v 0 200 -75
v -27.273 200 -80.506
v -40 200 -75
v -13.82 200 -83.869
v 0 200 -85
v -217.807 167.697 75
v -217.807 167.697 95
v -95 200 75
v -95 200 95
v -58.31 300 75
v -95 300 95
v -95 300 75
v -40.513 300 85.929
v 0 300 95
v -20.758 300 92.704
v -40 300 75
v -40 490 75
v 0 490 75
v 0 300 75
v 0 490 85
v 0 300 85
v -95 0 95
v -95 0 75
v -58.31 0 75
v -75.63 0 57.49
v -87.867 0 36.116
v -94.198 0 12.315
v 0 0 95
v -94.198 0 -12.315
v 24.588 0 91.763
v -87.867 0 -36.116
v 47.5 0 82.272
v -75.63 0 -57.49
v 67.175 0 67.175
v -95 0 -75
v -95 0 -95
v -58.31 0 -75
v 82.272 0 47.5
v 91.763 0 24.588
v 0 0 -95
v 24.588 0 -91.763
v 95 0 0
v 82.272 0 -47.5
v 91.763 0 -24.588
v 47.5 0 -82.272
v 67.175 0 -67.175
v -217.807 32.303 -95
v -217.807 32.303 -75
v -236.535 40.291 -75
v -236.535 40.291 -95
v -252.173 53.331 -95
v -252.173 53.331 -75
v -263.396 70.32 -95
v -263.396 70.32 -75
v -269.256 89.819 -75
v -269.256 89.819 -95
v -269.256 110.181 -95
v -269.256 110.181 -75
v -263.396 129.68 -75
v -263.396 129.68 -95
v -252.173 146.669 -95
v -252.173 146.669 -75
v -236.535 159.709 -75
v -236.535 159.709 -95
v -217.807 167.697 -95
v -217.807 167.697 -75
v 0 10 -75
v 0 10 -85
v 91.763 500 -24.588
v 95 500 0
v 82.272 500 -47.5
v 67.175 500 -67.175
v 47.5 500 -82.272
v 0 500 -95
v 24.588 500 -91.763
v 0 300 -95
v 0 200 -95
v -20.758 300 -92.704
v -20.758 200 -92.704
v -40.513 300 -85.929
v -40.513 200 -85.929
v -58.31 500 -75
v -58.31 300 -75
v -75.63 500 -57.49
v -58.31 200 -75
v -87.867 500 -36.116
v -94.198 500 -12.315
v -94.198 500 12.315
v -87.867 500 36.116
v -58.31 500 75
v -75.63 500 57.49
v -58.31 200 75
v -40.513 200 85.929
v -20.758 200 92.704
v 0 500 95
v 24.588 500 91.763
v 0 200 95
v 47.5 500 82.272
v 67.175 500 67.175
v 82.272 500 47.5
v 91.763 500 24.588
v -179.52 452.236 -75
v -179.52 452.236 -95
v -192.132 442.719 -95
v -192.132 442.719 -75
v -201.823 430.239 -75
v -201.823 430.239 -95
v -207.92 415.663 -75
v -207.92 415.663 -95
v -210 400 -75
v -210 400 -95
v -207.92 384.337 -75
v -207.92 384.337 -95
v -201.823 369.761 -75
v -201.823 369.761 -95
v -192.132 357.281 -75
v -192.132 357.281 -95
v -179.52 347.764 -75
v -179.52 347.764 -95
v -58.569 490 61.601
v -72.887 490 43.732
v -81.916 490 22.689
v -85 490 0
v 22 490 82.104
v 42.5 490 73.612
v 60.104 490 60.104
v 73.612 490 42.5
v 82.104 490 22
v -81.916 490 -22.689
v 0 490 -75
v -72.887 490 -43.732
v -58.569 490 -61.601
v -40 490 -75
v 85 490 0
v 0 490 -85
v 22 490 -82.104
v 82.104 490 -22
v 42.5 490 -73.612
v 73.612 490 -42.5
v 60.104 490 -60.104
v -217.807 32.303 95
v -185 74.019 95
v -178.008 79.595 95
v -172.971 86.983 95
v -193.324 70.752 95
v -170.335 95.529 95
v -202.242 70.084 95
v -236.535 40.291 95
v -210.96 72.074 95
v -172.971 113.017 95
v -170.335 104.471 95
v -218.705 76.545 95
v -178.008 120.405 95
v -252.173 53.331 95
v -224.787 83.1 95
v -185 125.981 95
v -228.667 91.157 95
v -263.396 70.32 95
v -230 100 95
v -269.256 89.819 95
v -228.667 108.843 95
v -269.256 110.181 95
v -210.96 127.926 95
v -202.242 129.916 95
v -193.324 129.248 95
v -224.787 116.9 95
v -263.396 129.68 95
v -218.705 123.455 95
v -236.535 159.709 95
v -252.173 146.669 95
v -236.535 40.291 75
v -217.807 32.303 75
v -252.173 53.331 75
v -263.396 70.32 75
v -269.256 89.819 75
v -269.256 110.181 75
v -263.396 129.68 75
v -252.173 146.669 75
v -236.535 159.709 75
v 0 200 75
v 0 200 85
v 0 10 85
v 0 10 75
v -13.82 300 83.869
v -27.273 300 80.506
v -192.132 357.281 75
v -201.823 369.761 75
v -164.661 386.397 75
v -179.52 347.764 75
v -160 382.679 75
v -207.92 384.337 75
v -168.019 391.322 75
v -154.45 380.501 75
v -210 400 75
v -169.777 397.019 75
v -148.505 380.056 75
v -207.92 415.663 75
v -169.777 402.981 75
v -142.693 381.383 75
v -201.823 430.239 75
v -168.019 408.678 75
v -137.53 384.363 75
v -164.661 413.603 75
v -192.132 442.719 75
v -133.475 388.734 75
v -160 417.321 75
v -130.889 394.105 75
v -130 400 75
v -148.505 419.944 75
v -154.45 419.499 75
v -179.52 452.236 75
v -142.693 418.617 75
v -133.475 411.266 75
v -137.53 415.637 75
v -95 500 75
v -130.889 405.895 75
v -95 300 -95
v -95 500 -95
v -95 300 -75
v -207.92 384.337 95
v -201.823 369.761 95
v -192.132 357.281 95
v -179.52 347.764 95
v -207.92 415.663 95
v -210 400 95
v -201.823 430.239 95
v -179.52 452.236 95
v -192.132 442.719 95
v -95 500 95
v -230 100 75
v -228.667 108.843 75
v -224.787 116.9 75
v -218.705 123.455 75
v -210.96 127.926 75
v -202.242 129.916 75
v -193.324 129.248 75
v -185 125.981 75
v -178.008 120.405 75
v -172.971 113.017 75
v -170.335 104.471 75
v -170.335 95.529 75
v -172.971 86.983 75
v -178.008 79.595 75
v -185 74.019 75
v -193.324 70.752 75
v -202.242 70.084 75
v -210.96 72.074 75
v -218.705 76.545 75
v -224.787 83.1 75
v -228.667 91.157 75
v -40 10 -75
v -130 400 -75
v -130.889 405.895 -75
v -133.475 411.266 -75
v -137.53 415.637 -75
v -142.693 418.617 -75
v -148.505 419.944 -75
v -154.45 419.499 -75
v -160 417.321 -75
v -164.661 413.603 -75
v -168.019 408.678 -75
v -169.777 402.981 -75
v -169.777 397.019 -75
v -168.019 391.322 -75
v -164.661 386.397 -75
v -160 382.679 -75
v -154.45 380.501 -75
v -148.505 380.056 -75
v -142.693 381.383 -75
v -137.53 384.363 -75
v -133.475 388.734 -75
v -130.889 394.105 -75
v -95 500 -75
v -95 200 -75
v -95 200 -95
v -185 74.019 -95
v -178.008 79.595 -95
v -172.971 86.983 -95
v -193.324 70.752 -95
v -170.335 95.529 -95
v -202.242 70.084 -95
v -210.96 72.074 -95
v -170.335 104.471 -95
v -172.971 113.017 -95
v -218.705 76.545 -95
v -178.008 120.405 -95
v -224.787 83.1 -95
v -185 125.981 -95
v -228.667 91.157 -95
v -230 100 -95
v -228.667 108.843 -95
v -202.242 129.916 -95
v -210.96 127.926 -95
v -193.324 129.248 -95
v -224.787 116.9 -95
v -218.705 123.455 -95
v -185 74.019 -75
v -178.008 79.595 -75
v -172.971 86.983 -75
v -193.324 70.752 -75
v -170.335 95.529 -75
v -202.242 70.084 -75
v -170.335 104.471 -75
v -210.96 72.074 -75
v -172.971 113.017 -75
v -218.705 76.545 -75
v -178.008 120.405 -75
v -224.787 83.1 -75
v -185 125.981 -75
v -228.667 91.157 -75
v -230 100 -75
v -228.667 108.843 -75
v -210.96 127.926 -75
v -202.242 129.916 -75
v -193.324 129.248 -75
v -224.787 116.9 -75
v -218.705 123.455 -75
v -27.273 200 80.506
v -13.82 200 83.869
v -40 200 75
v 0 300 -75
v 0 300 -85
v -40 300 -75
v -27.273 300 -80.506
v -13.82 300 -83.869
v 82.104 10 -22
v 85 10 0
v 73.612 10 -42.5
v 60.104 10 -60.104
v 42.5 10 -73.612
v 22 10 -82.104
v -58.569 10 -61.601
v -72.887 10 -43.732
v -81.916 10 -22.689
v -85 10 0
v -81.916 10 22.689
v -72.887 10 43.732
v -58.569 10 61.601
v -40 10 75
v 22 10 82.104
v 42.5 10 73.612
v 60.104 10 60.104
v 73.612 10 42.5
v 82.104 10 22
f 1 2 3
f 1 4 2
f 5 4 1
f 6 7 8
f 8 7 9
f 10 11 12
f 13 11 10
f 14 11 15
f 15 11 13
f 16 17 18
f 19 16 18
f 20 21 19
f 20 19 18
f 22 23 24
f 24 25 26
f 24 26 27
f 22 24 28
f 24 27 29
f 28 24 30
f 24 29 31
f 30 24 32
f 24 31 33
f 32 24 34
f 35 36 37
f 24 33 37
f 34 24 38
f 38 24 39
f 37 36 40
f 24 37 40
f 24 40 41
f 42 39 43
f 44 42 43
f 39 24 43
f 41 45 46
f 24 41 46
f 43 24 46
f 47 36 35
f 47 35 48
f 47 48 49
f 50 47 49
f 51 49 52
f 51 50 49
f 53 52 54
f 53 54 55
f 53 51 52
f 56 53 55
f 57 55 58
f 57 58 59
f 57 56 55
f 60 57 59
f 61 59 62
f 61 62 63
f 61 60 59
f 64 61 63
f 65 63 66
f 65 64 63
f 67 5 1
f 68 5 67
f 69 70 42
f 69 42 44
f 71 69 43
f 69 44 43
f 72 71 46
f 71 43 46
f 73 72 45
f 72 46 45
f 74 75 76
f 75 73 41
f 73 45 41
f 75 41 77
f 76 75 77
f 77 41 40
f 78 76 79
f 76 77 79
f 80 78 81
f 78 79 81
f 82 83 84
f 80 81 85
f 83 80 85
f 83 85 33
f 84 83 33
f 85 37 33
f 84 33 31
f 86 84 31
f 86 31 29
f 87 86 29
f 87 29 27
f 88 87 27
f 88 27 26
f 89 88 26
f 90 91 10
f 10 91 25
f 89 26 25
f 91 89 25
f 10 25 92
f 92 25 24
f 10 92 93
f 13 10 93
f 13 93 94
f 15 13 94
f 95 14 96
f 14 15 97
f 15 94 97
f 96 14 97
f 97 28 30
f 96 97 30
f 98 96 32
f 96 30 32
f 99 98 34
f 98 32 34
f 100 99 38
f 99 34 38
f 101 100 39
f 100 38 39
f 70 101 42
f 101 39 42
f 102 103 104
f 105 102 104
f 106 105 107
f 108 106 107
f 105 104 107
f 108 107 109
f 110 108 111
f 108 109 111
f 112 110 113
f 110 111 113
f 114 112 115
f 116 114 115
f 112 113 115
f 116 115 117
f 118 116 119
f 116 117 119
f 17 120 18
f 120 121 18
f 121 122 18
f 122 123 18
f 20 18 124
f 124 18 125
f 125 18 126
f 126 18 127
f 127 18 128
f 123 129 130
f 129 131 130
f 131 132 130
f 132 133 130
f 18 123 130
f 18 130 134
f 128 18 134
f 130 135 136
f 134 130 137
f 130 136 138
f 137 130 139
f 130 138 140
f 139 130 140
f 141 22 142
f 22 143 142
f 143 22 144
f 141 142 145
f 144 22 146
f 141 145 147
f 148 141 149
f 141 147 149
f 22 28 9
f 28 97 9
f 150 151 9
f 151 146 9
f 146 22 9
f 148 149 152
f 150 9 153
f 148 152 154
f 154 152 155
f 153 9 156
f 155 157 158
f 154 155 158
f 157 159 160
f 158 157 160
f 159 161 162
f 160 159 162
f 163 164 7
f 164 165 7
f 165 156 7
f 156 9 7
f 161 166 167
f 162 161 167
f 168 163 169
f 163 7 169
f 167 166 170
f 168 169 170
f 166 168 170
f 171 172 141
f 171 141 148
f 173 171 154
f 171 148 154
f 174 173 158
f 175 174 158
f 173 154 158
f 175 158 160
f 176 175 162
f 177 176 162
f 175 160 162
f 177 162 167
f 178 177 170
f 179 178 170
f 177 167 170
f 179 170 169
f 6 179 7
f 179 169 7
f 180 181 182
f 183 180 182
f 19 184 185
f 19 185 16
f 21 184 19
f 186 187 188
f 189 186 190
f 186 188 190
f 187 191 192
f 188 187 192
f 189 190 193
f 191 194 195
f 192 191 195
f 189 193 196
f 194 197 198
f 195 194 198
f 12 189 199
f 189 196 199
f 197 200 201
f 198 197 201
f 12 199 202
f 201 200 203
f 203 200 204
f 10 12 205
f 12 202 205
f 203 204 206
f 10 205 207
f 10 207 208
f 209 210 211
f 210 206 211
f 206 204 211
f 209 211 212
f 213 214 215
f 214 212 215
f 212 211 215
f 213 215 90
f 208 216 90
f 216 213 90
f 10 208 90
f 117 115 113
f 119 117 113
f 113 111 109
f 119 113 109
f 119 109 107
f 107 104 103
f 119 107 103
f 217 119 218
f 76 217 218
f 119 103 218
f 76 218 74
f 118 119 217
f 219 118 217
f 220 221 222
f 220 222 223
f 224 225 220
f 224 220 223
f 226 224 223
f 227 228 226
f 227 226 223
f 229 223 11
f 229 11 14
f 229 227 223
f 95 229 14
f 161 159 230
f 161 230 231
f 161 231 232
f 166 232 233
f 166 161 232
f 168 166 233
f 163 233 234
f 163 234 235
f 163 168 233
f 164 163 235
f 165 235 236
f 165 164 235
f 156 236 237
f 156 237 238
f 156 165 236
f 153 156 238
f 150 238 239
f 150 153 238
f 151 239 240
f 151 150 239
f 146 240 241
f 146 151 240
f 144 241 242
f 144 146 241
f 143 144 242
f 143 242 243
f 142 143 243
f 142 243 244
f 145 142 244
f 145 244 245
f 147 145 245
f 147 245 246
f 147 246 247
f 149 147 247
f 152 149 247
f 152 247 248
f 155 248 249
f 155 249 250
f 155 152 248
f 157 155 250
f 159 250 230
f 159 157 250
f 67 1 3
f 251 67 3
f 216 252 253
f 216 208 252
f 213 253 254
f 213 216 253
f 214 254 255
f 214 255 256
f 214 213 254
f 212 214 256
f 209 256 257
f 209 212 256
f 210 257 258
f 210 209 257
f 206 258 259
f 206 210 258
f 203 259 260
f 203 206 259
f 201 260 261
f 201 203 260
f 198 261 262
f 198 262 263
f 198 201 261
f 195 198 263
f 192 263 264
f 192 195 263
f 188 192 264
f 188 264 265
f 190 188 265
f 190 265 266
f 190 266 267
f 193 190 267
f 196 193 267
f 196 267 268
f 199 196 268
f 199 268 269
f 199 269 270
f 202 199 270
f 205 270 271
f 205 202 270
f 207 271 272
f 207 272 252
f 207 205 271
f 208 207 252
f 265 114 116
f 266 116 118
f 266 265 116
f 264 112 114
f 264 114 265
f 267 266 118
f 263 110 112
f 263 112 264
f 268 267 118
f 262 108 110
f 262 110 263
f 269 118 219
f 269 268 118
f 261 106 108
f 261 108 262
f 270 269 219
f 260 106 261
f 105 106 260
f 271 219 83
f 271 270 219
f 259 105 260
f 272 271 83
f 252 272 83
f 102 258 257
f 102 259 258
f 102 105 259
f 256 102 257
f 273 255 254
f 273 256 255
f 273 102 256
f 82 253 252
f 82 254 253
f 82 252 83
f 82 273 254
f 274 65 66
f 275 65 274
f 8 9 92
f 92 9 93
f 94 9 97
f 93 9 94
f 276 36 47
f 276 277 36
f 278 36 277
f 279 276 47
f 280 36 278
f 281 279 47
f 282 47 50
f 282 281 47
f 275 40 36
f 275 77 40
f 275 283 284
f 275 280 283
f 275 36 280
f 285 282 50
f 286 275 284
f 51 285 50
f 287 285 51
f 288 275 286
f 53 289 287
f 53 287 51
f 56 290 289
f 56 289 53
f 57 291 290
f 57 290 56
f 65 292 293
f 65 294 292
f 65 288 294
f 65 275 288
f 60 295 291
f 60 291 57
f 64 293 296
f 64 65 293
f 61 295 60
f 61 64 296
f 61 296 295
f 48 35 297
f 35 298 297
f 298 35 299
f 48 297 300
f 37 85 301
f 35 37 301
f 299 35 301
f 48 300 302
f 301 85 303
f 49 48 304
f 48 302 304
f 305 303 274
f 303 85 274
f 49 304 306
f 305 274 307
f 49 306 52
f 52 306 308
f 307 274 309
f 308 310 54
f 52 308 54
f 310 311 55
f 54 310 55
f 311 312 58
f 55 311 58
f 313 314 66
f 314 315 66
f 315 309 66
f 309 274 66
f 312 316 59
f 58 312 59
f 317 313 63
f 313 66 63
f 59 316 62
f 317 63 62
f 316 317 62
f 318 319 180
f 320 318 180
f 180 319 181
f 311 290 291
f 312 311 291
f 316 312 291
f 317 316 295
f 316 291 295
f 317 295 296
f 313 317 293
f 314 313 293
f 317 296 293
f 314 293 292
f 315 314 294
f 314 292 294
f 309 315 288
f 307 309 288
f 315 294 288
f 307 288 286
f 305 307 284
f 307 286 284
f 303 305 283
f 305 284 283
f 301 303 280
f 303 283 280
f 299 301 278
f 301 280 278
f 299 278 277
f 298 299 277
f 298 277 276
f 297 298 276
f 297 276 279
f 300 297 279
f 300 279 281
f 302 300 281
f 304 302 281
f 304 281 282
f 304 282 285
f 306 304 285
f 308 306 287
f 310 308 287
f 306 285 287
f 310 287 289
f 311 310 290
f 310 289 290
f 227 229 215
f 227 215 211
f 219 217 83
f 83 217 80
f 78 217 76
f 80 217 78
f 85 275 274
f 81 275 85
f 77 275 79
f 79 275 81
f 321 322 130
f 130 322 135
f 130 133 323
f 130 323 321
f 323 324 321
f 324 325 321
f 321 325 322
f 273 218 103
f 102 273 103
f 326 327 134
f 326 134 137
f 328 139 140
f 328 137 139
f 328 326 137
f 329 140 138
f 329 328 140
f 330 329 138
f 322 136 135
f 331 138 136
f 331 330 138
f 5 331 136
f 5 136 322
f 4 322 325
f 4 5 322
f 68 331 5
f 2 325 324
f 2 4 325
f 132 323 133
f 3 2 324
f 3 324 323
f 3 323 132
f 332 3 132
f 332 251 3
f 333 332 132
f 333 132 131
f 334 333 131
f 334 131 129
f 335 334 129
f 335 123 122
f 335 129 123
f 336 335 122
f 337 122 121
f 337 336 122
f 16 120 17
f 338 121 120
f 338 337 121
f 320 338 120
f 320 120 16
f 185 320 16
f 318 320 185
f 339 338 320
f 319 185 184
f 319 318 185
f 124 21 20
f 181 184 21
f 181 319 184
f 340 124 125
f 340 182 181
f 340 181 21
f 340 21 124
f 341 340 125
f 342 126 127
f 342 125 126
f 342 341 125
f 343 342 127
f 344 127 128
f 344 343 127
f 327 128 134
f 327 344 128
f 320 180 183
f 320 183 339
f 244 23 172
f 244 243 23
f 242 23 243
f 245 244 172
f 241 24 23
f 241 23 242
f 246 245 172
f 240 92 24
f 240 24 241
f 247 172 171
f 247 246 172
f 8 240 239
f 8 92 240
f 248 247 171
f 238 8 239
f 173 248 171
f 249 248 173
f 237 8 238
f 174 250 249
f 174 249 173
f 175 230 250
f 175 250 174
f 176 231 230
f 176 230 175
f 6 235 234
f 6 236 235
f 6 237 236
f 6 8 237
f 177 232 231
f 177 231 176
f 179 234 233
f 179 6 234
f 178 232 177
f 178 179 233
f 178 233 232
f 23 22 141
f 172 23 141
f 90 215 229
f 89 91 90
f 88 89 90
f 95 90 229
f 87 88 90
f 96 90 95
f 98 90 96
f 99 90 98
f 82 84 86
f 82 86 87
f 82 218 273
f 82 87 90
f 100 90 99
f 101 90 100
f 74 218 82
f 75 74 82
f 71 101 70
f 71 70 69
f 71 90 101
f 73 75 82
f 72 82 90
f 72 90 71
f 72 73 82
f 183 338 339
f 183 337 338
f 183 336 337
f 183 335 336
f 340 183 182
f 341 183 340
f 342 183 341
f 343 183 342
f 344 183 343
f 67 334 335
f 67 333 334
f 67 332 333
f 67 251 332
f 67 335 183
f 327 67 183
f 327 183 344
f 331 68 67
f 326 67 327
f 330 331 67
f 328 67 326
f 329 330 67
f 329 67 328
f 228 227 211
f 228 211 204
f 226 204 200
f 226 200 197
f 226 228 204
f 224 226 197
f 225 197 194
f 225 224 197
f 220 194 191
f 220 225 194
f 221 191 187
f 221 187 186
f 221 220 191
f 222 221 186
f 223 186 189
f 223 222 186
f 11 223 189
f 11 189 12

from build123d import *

# Parameters (mm, degrees)
SKETCH1_R           = 95
BOSS_EXTRUDE1_DEPTH = 500
SHELL1_T            = 10
SKETCH2_R           = 30
BOSS_EXTRUDE2_DEPTH = 20
SKETCH4_R           = 20
BOSS_EXTRUDE3_DEPTH = 95


with BuildPart() as part:
    # Sketch1 → Boss-Extrude1 (new body)
    with BuildSketch(Plane(origin=(0, 0, 0), x_dir=(1, 0, 0), z_dir=(0, 1, 0))):
        Circle(SKETCH1_R)
    extrude(amount=BOSS_EXTRUDE1_DEPTH)

    # Shell1 (no face opened: a closed hollow body)
    add(offset(amount=-SHELL1_T, mode=Mode.PRIVATE), mode=Mode.SUBTRACT)

    # Sketch2 → Boss-Extrude2 (add)
    with BuildSketch(Plane(origin=(0, 0, -95), x_dir=(-1, 0, 0), z_dir=(0, 0, -1))):
        with BuildLine():
            Line((0, 0), (95, 0))
            Line((95, 0), (217.806884991, 32.302770759))
            ThreePointArc((217.806884991, 32.302770759), (270, 100), (217.806884991, 167.697229241))
            Line((217.806884991, 167.697229241), (95, 200))
            Line((95, 200), (0, 200))
            Line((0, 200), (0, 0))
        make_face()
        with Locations((200, 100)):
            Circle(SKETCH2_R, mode=Mode.SUBTRACT)
        with BuildLine():
            Line((0, 500), (95, 500))
            Line((95, 500), (179.519741664, 452.235857915))
            ThreePointArc((179.519741664, 452.235857915), (210, 400), (179.519741664, 347.764142085))
            Line((179.519741664, 347.764142085), (95, 300))
            Line((95, 300), (0, 300))
            Line((0, 300), (0, 500))
        make_face()
    boss_extrude2 = extrude(amount=-BOSS_EXTRUDE2_DEPTH)

    # Mirror1: Boss-Extrude2 across plane
    add(boss_extrude2.mirror(Plane(origin=(0, 0, 0), x_dir=(1, 0, 0), z_dir=(0, 0, -1))))

    # Sketch4 → Boss-Extrude3 (add, symmetric)
    with BuildSketch(Plane.XY):
        with Locations((-150, 400)):
            Circle(SKETCH4_R)
    extrude(amount=BOSS_EXTRUDE3_DEPTH, both=True)


solid = part.part
